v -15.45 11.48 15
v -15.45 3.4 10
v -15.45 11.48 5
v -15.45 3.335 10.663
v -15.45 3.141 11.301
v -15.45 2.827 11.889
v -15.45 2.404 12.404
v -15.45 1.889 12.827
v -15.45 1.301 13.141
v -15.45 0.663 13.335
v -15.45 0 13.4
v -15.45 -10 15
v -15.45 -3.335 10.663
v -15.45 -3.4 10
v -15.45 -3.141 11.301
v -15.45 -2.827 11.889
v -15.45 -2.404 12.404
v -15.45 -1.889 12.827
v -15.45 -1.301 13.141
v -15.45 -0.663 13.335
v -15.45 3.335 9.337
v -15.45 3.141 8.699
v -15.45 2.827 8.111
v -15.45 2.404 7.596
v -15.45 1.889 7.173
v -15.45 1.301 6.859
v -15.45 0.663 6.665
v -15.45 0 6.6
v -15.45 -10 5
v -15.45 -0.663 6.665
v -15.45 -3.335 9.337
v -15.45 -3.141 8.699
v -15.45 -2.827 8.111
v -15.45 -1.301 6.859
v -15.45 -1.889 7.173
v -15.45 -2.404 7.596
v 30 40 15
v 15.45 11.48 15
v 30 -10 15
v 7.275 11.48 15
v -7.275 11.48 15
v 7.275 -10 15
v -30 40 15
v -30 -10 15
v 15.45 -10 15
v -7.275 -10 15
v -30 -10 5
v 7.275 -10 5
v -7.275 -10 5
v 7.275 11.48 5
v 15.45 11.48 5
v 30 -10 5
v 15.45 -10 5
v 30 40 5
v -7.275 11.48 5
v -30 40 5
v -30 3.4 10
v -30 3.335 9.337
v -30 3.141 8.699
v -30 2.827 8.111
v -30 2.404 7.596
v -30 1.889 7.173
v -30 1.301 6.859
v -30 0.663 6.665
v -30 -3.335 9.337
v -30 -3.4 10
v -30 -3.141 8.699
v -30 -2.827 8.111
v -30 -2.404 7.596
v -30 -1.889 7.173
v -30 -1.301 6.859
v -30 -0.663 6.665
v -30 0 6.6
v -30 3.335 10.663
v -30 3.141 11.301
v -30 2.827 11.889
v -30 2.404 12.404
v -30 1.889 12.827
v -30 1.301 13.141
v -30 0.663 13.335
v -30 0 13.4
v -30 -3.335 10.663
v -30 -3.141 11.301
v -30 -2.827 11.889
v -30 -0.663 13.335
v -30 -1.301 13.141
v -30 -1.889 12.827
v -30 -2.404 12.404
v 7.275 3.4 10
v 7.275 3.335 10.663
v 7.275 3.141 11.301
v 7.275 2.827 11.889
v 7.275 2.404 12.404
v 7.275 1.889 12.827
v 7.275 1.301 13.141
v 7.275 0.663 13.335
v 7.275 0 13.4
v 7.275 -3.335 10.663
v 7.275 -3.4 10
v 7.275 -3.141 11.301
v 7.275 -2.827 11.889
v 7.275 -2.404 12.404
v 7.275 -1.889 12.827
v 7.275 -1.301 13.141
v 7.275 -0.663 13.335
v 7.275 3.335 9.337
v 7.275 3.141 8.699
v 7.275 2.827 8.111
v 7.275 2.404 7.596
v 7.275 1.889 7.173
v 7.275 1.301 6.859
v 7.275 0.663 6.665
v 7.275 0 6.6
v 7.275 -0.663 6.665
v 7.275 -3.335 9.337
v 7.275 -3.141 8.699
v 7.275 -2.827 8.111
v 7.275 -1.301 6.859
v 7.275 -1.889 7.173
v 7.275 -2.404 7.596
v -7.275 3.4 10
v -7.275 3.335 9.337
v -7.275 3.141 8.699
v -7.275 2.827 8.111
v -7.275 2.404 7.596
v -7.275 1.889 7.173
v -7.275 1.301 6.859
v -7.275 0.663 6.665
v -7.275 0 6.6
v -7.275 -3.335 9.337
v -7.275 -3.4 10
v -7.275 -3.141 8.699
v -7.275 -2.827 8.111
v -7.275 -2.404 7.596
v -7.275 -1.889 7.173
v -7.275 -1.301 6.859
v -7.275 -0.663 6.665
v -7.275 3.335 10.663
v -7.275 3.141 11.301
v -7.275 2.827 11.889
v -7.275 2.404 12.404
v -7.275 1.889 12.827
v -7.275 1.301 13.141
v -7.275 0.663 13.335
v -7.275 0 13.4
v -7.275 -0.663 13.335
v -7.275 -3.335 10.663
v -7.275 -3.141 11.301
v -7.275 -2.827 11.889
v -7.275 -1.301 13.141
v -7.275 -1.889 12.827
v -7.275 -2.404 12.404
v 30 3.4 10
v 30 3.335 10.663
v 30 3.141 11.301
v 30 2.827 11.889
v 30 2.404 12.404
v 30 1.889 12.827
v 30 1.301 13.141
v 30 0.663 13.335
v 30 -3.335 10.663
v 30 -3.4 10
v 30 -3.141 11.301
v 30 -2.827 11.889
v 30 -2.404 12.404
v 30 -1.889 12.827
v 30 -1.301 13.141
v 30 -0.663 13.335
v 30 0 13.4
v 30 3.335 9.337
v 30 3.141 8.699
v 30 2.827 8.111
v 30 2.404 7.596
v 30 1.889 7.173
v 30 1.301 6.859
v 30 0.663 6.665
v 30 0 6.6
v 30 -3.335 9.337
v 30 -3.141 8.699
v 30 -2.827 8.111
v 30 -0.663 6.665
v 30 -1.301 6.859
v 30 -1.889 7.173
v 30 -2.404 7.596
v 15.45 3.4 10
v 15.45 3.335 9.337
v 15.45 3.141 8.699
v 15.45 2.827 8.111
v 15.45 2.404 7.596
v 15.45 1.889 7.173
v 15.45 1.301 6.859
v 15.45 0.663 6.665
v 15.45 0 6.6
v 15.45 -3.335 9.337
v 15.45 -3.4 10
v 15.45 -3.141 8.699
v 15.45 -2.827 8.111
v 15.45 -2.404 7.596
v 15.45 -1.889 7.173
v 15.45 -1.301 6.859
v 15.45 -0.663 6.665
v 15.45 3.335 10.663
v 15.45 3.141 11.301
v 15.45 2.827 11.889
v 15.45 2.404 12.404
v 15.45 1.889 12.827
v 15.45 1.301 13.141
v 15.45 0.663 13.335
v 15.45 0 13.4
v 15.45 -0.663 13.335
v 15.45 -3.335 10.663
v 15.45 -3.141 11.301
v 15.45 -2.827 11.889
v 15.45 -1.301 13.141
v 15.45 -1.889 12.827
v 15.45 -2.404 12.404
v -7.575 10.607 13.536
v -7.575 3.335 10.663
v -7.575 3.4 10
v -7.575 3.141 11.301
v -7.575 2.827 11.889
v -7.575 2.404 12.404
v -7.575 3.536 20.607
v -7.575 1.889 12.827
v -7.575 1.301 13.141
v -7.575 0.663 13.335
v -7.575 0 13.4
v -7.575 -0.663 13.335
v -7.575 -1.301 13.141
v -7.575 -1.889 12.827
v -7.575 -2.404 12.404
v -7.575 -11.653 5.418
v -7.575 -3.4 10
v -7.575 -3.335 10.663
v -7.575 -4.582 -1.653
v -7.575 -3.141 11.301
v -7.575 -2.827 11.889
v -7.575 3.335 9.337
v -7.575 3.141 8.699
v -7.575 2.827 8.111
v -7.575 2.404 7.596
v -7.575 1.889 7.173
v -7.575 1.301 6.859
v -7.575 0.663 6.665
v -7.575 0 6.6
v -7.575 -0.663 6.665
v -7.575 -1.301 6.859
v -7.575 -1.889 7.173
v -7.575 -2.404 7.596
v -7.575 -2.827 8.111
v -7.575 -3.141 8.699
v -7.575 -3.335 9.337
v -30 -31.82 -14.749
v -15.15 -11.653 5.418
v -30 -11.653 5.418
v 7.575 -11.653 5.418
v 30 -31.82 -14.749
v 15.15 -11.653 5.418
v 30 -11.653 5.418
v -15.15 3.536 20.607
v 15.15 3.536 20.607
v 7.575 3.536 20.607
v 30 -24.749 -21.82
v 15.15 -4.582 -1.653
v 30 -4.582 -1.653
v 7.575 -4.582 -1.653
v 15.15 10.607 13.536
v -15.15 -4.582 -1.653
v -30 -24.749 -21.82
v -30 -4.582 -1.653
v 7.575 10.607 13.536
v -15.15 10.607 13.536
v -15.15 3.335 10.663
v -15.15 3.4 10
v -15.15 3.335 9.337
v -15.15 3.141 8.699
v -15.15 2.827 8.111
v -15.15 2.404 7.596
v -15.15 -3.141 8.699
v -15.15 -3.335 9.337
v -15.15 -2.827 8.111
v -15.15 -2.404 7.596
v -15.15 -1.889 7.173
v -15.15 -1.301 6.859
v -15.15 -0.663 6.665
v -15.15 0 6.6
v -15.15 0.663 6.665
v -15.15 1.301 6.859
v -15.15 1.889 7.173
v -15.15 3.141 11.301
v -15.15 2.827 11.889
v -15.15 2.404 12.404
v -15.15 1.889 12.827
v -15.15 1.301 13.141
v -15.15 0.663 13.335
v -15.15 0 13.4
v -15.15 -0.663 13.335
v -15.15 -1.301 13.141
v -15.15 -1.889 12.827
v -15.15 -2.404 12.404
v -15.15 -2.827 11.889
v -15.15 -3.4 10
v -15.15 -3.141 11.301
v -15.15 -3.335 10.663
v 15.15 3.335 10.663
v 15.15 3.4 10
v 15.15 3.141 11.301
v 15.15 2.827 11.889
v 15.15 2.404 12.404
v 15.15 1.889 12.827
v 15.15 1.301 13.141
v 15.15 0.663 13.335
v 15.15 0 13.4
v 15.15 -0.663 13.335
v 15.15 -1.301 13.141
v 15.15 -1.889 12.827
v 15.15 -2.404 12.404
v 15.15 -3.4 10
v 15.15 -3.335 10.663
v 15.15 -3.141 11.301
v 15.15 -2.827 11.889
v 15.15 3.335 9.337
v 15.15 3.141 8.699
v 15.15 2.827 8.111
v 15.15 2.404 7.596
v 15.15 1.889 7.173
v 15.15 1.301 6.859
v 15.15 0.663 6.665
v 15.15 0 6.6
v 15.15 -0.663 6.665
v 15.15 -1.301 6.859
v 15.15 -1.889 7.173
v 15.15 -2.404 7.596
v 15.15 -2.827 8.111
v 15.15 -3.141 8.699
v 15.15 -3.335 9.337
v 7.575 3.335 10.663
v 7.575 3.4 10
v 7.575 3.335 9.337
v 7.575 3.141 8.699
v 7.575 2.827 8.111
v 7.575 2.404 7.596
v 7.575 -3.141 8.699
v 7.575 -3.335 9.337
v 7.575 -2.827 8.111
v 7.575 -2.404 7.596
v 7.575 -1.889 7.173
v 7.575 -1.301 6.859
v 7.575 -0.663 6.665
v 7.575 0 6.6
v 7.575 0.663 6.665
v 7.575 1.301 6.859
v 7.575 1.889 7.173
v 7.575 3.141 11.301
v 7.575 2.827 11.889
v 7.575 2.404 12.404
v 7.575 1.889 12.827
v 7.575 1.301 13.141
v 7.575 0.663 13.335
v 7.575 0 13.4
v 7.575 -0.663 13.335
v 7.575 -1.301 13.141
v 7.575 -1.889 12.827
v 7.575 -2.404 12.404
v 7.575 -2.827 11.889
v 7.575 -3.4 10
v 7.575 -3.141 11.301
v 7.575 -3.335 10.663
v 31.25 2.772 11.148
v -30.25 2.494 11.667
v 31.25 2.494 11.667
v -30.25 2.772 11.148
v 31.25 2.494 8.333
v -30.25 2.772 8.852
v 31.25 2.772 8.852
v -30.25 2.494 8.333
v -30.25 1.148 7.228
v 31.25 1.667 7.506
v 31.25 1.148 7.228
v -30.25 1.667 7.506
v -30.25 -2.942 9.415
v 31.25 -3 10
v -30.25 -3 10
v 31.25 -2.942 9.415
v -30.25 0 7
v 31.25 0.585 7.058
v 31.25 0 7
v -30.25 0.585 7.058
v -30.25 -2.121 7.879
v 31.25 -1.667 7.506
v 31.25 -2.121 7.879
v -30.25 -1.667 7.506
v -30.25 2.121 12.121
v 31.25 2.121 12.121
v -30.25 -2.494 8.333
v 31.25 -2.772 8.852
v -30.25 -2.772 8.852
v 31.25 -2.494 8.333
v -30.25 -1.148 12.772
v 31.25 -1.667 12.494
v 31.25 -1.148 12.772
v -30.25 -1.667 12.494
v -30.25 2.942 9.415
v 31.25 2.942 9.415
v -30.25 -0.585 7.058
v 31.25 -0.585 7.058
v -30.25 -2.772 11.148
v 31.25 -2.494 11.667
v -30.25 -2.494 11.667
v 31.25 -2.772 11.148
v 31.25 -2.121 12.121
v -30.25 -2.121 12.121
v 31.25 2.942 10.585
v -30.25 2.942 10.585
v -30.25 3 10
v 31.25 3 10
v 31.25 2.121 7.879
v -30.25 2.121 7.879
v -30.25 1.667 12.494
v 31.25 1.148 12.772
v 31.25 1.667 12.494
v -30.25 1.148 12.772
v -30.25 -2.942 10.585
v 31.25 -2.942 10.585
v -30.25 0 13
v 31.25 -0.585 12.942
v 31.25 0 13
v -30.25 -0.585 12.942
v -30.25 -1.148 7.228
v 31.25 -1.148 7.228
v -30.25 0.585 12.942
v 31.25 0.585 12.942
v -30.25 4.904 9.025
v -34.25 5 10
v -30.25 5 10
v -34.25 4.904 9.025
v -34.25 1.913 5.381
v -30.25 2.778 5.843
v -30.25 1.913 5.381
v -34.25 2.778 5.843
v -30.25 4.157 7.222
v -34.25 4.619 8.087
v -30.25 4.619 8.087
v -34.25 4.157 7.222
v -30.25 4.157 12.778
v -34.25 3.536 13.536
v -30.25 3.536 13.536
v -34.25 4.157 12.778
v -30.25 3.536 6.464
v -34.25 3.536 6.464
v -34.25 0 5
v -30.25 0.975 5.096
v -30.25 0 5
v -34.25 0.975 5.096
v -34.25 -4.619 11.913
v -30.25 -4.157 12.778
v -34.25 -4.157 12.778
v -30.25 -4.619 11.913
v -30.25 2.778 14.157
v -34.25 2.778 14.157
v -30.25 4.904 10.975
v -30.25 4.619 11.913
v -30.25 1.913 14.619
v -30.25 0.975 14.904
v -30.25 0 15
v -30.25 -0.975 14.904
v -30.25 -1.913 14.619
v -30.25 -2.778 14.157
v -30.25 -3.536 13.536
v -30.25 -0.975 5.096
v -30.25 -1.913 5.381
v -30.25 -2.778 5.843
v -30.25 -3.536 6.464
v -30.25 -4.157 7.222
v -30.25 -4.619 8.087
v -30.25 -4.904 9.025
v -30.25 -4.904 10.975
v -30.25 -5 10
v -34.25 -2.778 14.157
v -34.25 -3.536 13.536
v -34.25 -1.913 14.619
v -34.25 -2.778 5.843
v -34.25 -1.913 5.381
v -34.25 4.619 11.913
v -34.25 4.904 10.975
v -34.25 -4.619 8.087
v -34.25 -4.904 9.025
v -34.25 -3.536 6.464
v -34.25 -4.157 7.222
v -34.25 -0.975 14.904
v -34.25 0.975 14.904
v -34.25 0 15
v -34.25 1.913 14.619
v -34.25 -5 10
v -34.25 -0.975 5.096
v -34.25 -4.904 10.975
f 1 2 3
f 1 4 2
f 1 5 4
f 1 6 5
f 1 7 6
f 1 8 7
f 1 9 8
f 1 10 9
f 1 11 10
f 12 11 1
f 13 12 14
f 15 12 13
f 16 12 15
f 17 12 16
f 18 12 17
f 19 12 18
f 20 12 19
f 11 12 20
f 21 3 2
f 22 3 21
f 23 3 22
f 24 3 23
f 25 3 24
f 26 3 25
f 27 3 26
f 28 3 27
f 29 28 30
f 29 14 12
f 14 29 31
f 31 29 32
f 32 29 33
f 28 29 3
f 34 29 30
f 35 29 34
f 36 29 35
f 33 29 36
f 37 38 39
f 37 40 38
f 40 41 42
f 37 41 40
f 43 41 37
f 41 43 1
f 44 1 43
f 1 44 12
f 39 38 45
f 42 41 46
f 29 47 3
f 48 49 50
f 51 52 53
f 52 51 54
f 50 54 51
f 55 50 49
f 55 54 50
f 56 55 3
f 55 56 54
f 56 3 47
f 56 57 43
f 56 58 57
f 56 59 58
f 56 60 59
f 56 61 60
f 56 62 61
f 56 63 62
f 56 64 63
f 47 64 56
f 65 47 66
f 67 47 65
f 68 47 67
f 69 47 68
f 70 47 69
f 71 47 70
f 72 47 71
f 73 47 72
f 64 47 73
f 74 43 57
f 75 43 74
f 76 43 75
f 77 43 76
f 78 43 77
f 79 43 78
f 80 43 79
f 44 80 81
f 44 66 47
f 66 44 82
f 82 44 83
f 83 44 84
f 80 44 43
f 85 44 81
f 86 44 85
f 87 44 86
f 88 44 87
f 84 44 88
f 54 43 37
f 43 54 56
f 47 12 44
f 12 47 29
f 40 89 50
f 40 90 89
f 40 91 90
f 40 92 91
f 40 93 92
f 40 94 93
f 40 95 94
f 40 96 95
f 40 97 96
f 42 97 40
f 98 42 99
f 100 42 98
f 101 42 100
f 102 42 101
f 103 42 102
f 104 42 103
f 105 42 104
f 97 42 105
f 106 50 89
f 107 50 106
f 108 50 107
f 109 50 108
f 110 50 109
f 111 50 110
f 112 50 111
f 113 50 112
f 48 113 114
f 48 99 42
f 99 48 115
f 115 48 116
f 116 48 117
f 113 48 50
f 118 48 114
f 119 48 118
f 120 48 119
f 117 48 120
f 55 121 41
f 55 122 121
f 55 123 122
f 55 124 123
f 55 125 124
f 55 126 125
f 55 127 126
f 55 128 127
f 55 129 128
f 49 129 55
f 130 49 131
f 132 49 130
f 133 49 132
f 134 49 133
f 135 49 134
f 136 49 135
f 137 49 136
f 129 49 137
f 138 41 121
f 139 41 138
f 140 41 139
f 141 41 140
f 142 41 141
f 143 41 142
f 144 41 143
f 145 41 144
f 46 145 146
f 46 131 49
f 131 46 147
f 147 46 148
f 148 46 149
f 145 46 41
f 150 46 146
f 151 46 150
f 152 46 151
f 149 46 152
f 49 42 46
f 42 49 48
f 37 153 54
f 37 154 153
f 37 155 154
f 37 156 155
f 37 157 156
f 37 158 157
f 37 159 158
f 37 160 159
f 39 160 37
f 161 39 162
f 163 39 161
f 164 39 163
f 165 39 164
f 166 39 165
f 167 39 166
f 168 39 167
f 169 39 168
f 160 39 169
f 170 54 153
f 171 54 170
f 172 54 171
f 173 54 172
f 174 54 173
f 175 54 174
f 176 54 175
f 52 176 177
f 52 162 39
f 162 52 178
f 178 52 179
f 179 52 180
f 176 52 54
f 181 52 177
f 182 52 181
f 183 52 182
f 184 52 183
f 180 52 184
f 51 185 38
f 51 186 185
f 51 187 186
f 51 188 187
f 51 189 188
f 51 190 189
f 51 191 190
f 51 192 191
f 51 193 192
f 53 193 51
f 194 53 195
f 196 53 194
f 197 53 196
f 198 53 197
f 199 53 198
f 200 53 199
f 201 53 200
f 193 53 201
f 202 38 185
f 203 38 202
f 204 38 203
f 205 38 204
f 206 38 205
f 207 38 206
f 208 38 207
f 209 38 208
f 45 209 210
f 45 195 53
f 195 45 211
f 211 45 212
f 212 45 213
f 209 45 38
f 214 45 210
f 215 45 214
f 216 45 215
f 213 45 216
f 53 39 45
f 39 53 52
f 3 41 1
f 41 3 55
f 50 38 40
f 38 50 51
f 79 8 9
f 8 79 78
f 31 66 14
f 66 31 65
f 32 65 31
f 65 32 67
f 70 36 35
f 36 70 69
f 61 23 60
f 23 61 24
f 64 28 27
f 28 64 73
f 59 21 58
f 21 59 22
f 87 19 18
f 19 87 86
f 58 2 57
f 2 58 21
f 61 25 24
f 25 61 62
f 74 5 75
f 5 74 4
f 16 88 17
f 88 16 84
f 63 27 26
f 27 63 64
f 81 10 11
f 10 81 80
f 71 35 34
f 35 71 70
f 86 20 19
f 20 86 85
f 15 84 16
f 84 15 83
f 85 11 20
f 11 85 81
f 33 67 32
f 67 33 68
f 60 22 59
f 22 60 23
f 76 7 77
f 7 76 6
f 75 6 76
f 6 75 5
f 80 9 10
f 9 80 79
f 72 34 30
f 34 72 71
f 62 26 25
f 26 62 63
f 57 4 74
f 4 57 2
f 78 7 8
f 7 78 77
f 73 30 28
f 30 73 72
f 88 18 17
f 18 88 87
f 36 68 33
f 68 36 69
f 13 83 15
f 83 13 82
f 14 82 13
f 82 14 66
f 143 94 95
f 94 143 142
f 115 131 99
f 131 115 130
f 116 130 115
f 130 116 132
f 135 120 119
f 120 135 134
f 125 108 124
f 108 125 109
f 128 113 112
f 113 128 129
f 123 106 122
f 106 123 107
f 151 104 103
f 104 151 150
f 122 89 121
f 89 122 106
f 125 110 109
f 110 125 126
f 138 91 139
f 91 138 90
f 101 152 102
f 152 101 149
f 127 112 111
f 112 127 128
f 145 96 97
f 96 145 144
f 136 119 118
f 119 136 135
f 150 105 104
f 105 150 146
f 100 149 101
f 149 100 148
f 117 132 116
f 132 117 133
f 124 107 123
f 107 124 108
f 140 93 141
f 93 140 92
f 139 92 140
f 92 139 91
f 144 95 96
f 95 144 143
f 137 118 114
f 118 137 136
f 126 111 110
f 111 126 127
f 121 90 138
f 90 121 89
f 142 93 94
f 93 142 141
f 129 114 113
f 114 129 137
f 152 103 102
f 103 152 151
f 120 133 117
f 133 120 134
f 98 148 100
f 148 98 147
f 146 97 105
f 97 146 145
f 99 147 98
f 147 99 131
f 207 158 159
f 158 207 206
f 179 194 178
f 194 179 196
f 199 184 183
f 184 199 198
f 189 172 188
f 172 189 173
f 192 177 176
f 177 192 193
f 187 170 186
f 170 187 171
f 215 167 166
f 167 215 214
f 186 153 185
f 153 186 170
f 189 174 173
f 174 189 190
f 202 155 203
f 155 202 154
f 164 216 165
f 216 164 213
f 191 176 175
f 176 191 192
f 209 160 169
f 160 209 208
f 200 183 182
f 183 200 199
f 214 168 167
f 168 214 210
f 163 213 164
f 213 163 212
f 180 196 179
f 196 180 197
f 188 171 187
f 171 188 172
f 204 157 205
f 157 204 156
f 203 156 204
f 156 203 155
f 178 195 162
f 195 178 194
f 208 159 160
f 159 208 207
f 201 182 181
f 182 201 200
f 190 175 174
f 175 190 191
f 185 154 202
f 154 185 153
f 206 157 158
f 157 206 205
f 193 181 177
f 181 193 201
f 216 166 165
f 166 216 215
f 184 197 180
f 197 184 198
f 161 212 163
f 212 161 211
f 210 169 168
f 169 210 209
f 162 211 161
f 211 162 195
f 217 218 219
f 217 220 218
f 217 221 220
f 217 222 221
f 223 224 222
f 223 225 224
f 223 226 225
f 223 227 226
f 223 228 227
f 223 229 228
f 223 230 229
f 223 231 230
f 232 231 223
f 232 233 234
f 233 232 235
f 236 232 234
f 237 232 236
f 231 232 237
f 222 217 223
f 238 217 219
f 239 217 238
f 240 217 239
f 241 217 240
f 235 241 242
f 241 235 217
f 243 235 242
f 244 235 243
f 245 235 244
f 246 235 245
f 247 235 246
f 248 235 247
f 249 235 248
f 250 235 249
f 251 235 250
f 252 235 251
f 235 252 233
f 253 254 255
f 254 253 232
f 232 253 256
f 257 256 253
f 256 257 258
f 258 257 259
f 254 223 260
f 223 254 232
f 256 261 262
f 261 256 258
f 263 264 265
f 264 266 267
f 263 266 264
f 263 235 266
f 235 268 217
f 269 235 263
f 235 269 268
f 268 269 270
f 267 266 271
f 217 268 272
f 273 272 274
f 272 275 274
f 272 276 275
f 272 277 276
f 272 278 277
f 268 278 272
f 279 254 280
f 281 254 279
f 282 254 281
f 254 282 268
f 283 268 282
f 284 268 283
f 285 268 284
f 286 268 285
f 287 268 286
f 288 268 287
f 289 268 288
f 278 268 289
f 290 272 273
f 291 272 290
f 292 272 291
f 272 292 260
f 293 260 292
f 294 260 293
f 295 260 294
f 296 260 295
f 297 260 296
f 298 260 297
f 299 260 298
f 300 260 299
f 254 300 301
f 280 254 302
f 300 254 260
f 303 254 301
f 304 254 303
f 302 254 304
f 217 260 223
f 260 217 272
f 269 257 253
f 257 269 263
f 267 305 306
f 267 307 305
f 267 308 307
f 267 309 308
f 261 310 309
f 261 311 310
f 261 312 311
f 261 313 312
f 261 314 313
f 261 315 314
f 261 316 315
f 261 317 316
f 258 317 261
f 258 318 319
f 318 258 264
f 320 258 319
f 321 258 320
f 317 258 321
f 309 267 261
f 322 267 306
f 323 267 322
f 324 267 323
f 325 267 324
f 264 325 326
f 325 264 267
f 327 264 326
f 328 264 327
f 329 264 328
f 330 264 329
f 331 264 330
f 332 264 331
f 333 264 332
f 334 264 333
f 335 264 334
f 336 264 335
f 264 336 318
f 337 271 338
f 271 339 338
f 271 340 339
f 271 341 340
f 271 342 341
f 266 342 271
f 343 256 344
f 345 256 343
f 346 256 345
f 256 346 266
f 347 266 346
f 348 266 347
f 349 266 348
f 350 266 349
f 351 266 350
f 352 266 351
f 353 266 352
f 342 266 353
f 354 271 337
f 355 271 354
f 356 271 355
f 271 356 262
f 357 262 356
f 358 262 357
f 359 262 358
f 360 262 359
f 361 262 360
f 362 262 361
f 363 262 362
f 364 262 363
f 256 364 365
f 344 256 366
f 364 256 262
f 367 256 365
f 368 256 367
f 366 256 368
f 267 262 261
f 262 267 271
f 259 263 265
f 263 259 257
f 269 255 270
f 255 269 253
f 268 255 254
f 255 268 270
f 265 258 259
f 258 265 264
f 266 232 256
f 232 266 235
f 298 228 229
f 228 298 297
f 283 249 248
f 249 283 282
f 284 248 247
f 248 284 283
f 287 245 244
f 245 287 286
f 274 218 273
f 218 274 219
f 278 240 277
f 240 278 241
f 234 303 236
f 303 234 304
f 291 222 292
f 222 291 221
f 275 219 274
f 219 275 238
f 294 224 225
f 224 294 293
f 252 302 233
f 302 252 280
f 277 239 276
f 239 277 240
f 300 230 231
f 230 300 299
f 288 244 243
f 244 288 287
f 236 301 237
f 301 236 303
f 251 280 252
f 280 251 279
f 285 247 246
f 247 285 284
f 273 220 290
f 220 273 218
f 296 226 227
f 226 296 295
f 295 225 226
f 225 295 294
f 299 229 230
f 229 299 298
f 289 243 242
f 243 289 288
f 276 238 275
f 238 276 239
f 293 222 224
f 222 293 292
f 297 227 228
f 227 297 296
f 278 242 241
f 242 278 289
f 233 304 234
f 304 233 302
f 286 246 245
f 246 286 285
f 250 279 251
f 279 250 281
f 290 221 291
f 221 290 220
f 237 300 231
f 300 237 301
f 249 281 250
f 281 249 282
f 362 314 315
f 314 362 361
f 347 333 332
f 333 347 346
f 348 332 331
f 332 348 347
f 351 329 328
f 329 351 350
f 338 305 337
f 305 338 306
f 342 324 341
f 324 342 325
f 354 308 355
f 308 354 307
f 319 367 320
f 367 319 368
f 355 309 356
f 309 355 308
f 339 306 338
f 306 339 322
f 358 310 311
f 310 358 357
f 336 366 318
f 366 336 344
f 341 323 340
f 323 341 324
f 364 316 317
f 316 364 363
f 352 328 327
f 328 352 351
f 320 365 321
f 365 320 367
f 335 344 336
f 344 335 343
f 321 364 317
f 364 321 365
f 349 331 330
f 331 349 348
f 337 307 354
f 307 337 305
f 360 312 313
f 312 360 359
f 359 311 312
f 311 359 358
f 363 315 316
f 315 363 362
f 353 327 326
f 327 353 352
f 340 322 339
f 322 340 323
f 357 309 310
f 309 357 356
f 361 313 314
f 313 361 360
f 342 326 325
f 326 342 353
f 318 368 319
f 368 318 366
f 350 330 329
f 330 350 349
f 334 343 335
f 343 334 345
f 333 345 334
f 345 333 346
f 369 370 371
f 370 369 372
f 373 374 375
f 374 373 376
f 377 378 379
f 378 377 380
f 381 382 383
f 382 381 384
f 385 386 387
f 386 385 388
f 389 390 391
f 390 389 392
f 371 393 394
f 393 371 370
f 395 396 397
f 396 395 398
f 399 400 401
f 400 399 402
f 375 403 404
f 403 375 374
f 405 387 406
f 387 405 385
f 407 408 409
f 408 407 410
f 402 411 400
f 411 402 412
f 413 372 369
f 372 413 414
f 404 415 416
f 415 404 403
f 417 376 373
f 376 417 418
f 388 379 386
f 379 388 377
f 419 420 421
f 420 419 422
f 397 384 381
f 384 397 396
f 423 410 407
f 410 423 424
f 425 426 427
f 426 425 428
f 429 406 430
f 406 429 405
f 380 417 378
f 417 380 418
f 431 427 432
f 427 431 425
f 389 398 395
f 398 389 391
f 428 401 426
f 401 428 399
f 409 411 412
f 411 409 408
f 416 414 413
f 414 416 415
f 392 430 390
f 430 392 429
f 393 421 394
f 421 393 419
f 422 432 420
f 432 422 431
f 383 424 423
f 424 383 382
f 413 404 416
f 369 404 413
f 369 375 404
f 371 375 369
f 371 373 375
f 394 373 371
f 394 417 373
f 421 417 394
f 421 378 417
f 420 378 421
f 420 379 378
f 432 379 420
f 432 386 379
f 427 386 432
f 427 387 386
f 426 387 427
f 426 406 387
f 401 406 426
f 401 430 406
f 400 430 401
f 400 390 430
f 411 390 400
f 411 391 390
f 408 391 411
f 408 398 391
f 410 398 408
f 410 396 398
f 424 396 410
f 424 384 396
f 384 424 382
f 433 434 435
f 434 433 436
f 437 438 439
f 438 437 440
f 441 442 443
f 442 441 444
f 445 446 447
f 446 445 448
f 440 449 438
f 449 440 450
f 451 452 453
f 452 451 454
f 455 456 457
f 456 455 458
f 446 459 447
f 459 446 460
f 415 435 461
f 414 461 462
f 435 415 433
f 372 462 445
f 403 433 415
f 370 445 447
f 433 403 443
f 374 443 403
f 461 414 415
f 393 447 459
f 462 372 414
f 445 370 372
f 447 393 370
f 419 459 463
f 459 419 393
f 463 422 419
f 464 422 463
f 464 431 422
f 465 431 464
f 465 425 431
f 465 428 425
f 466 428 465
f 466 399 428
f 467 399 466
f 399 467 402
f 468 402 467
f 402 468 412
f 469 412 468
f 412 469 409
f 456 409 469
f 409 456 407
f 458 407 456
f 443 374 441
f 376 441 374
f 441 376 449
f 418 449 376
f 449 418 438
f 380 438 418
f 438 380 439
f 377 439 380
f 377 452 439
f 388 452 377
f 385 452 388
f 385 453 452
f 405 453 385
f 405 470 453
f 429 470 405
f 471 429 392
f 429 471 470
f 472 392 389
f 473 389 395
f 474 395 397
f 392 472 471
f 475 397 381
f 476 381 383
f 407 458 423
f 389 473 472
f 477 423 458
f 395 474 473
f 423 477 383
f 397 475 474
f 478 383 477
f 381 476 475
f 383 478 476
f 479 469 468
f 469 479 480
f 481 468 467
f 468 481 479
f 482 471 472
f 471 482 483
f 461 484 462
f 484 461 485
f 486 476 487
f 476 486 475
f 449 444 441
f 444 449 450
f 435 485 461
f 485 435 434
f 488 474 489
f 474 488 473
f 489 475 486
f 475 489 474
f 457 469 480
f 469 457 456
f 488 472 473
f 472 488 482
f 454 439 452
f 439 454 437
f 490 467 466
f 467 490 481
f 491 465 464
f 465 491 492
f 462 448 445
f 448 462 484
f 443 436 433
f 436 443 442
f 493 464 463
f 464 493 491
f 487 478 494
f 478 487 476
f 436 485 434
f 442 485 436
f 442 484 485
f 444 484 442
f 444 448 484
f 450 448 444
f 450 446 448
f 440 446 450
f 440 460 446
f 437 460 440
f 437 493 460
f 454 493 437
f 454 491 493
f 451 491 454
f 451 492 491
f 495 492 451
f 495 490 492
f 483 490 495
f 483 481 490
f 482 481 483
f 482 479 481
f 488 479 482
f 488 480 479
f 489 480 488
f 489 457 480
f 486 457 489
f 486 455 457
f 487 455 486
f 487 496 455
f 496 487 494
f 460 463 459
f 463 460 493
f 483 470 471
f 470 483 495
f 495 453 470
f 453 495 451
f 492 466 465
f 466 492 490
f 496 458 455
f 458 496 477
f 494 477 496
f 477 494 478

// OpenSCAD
$fn = 32;

// ------------------------------------------------------------------------
// Butt hinge: hinge 60 mm, leaf swung 45 deg
// Every part is its own module, assembly() places every instance.
// ------------------------------------------------------------------------

// --- part 1 ---
module hinge_base() {
  difference() {
    union() {
      translate([-30, -10, -5]) cube([14.55, 50, 10]);
      translate([-7.275, -10, -5]) cube([14.55, 50, 10]);
      translate([15.45, -10, -5]) cube([14.55, 50, 10]);
      translate([-30, 11.48, -5]) cube([60, 28.52, 10]);
    }
    translate([-22.725, 0, 0]) rotate([0, 90, 0]) cylinder(h = 16.55, d = 6.8, center = true);
    translate([0, 0, 0]) rotate([0, 90, 0]) cylinder(h = 16.55, d = 6.8, center = true);
    translate([22.725, 0, 0]) rotate([0, 90, 0]) cylinder(h = 16.55, d = 6.8, center = true);
  }
}

// --- part 2 ---
module hinge_mover() {
  difference() {
    union() {
      translate([-15.15, -40, -5]) cube([7.575, 50, 10]);
      translate([7.575, -40, -5]) cube([7.575, 50, 10]);
      translate([-30, -40, -5]) cube([60, 28.52, 10]);
    }
    translate([-11.362, 0, 0]) rotate([0, 90, 0]) cylinder(h = 9.575, d = 6.8, center = true);
    translate([11.362, 0, 0]) rotate([0, 90, 0]) cylinder(h = 9.575, d = 6.8, center = true);
  }
}

// --- part 3 ---
module hinge_pin() {
  rotate([0, 90, 0]) cylinder(h = 62.5, d = 6, center = true);
  translate([-34.25, 0, 0]) rotate([0, 90, 0]) cylinder(h = 4, d = 10);
}

// --- assembly ---
module assembly() {
  color([0.80, 0.24, 0.20]) translate([0, 0, 10]) rotate([0, 0, 0]) hinge_base();
  color([0.20, 0.45, 0.75]) translate([0, 0, 10]) rotate([45, 0, 0]) hinge_mover();
  color([0.25, 0.62, 0.32]) translate([0, 0, 10]) rotate([0, 0, 0]) hinge_pin();
}

assembly();
